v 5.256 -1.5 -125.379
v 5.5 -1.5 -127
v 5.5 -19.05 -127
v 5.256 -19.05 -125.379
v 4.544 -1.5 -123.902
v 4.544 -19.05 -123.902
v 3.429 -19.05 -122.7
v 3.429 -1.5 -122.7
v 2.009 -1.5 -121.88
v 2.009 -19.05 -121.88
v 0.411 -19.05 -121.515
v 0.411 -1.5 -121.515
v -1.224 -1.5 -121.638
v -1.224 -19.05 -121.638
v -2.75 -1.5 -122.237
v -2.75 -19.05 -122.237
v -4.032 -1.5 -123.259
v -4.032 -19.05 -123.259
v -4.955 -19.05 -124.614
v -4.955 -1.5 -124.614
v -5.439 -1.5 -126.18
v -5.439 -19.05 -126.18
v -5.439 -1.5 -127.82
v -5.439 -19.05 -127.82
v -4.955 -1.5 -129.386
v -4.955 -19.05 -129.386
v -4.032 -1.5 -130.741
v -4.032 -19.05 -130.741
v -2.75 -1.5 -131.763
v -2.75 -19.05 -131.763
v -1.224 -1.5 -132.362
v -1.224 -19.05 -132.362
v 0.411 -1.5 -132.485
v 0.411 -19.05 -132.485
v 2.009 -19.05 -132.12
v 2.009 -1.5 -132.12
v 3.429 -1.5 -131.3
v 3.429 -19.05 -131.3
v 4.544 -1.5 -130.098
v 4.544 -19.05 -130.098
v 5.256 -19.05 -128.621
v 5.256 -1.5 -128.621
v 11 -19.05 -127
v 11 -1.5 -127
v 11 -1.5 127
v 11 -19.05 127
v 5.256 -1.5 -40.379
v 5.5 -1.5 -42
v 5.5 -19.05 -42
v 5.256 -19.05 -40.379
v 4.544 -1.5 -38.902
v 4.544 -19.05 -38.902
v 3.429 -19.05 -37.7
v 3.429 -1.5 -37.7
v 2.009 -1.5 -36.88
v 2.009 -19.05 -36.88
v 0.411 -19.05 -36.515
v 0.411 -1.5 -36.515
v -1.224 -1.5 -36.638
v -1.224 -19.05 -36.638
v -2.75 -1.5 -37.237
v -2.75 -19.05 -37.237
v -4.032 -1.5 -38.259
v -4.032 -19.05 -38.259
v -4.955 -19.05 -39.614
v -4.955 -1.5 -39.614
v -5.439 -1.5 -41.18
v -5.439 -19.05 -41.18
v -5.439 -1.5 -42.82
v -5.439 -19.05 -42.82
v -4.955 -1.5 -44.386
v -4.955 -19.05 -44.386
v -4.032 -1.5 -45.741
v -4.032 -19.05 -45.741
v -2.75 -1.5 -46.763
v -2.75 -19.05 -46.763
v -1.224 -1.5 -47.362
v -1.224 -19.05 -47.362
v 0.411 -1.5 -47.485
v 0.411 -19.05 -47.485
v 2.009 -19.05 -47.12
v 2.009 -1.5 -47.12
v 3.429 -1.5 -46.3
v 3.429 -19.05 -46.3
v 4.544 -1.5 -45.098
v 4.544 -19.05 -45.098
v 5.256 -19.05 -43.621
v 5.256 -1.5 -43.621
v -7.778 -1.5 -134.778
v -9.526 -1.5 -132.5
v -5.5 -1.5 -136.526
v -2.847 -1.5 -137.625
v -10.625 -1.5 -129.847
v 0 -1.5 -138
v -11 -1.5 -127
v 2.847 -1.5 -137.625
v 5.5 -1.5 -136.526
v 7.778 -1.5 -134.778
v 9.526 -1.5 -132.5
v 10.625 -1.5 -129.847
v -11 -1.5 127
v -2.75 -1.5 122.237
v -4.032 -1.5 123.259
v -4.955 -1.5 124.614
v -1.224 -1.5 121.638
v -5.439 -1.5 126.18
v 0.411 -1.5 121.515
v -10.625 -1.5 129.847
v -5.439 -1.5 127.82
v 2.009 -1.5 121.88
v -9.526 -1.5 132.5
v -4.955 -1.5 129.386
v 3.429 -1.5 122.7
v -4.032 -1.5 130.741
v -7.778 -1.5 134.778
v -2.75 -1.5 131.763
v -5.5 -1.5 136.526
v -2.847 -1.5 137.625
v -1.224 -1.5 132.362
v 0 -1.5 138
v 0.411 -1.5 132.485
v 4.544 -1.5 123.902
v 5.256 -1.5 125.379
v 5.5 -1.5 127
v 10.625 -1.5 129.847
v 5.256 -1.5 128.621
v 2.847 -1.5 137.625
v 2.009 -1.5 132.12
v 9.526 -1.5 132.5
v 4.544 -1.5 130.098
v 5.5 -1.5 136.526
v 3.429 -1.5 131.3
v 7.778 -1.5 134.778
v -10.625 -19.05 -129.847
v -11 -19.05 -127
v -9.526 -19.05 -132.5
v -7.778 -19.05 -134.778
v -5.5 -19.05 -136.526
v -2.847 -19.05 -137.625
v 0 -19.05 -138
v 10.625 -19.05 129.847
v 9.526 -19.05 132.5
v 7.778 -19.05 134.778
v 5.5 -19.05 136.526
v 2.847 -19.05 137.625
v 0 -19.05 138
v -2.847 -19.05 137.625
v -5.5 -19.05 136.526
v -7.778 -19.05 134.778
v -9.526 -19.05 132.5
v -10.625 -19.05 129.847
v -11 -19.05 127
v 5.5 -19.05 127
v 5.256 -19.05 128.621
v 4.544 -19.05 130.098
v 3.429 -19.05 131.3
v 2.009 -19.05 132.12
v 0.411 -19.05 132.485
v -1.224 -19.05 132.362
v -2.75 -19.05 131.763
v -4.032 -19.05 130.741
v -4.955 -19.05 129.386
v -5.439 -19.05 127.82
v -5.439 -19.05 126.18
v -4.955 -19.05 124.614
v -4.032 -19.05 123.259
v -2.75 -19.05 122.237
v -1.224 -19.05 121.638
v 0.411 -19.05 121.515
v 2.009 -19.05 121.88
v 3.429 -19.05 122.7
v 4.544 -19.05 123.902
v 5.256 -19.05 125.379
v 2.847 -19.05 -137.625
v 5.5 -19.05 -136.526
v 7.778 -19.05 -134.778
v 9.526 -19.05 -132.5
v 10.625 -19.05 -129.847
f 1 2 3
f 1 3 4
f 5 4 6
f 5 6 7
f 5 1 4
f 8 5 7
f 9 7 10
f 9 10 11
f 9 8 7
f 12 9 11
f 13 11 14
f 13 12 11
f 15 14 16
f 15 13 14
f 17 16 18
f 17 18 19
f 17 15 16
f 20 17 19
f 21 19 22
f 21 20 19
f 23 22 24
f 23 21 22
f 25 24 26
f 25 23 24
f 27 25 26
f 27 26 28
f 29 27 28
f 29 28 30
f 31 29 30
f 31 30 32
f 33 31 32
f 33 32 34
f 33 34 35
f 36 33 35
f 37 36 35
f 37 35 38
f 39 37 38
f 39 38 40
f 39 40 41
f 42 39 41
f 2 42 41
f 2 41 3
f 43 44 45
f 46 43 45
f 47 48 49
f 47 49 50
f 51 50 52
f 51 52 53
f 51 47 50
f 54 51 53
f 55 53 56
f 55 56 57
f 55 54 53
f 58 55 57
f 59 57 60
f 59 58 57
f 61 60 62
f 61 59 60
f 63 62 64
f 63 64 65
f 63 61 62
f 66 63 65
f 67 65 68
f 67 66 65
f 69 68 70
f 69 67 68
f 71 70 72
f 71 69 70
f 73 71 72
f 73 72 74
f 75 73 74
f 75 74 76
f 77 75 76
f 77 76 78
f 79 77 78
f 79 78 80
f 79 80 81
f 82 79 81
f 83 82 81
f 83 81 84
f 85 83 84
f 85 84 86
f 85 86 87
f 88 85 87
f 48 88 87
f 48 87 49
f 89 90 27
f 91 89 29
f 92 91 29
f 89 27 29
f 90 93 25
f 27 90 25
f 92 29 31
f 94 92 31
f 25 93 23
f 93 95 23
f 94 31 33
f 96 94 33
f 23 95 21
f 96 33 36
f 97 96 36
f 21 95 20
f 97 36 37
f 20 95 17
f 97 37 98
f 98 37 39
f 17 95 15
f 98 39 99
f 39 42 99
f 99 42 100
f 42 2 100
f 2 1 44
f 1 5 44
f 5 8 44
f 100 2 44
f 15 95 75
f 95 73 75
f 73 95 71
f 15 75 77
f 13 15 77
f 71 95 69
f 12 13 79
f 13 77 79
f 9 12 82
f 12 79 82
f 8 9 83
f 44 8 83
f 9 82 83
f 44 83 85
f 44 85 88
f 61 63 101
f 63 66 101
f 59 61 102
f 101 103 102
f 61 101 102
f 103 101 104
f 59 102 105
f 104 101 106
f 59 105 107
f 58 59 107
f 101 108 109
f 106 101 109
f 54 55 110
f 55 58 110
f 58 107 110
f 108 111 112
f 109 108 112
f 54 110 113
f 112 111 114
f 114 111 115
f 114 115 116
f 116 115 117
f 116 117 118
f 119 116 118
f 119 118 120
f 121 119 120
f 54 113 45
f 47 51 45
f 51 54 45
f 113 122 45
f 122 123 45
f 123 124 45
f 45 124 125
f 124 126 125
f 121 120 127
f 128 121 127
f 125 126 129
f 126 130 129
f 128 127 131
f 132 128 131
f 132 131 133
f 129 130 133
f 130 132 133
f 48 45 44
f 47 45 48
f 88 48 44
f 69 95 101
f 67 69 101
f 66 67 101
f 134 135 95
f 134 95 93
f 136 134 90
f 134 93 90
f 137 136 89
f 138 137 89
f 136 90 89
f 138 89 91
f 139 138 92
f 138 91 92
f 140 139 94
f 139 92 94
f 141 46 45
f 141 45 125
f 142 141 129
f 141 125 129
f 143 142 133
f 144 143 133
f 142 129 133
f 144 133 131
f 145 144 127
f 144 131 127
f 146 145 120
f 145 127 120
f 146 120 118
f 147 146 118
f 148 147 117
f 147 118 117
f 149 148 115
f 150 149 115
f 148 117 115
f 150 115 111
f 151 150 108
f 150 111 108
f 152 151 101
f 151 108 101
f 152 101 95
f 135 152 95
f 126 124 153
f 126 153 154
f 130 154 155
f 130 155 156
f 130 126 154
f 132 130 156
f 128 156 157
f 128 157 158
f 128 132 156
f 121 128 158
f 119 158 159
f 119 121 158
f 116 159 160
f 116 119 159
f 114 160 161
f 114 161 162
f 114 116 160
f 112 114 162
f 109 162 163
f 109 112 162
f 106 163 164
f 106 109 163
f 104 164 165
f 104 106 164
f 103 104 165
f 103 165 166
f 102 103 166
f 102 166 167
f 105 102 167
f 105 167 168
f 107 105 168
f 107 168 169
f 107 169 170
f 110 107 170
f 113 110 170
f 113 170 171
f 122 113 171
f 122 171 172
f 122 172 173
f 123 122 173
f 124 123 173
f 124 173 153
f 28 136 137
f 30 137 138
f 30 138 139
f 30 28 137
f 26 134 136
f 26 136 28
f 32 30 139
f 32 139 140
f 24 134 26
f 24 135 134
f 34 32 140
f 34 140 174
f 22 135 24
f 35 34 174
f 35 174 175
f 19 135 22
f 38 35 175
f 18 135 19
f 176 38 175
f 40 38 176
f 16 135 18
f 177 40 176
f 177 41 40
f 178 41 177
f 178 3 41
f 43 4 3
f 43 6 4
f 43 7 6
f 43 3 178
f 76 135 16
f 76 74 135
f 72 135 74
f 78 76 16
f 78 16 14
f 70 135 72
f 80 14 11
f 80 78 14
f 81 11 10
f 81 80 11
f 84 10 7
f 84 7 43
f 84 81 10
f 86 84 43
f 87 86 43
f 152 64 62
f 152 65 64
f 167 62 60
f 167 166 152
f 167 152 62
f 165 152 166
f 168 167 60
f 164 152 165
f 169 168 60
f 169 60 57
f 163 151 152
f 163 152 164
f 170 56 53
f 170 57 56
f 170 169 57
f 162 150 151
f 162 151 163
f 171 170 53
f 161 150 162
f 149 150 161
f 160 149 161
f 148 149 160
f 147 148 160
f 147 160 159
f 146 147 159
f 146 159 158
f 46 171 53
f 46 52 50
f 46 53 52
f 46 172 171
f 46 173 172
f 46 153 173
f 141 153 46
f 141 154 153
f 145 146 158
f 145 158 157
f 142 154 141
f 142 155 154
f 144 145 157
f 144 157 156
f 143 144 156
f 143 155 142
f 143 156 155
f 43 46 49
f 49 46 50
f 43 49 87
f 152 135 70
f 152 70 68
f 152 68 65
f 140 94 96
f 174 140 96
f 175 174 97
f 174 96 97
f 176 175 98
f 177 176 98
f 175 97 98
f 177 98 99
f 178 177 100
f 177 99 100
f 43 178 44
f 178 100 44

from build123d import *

# Parameters (mm, degrees)
F0_R     = 5.5
F1_DEPTH = 19.05
F2_DEPTH = 1.5


# Not quite as in the source:
# - a length typed as a fraction of an inch, garbled in the dataset ("3 / 203.2 mm" for 3/8 in), is restored
# - a feature names something its author has since deleted; it is built from what else it names


with BuildPart() as f1:
    # F0 (on Front) → F1 (new body)
    with BuildSketch(Plane.XZ):
        with BuildLine():
            Line((11, -127), (11, 127))
            ThreePointArc((11, 127), (7.7781745931, 134.7781745931), (0, 138))
            ThreePointArc((0, 138), (-7.7781745931, 134.7781745931), (-11, 127))
            Line((-11, 127), (-11, -127))
            ThreePointArc((-11, -127), (-7.7781745931, -134.7781745931), (0, -138))
            ThreePointArc((0, -138), (7.7781745931, -134.7781745931), (11, -127))
        make_face()
        with Locations((0, -127)):
            Circle(F0_R, mode=Mode.SUBTRACT)
        with Locations((0, -41.9999994338)):
            Circle(F0_R, mode=Mode.SUBTRACT)
        with Locations((0, 127)):
            Circle(F0_R, mode=Mode.SUBTRACT)
    extrude(amount=F1_DEPTH)

    # F0 (on Front) → F2 (cut)
    with BuildSketch(Plane.XZ):
        with BuildLine():
            Line((11, -127), (11, 127))
            ThreePointArc((11, 127), (7.7781745931, 134.7781745931), (0, 138))
            ThreePointArc((0, 138), (-7.7781745931, 134.7781745931), (-11, 127))
            Line((-11, 127), (-11, -127))
            ThreePointArc((-11, -127), (-7.7781745931, -134.7781745931), (0, -138))
            ThreePointArc((0, -138), (7.7781745931, -134.7781745931), (11, -127))
        make_face()
        with Locations((0, -127)):
            Circle(F0_R, mode=Mode.SUBTRACT)
        with Locations((0, -41.9999994338)):
            Circle(F0_R, mode=Mode.SUBTRACT)
        with Locations((0, 127)):
            Circle(F0_R, mode=Mode.SUBTRACT)
    extrude(amount=F2_DEPTH, mode=Mode.SUBTRACT)


solid = f1.part
